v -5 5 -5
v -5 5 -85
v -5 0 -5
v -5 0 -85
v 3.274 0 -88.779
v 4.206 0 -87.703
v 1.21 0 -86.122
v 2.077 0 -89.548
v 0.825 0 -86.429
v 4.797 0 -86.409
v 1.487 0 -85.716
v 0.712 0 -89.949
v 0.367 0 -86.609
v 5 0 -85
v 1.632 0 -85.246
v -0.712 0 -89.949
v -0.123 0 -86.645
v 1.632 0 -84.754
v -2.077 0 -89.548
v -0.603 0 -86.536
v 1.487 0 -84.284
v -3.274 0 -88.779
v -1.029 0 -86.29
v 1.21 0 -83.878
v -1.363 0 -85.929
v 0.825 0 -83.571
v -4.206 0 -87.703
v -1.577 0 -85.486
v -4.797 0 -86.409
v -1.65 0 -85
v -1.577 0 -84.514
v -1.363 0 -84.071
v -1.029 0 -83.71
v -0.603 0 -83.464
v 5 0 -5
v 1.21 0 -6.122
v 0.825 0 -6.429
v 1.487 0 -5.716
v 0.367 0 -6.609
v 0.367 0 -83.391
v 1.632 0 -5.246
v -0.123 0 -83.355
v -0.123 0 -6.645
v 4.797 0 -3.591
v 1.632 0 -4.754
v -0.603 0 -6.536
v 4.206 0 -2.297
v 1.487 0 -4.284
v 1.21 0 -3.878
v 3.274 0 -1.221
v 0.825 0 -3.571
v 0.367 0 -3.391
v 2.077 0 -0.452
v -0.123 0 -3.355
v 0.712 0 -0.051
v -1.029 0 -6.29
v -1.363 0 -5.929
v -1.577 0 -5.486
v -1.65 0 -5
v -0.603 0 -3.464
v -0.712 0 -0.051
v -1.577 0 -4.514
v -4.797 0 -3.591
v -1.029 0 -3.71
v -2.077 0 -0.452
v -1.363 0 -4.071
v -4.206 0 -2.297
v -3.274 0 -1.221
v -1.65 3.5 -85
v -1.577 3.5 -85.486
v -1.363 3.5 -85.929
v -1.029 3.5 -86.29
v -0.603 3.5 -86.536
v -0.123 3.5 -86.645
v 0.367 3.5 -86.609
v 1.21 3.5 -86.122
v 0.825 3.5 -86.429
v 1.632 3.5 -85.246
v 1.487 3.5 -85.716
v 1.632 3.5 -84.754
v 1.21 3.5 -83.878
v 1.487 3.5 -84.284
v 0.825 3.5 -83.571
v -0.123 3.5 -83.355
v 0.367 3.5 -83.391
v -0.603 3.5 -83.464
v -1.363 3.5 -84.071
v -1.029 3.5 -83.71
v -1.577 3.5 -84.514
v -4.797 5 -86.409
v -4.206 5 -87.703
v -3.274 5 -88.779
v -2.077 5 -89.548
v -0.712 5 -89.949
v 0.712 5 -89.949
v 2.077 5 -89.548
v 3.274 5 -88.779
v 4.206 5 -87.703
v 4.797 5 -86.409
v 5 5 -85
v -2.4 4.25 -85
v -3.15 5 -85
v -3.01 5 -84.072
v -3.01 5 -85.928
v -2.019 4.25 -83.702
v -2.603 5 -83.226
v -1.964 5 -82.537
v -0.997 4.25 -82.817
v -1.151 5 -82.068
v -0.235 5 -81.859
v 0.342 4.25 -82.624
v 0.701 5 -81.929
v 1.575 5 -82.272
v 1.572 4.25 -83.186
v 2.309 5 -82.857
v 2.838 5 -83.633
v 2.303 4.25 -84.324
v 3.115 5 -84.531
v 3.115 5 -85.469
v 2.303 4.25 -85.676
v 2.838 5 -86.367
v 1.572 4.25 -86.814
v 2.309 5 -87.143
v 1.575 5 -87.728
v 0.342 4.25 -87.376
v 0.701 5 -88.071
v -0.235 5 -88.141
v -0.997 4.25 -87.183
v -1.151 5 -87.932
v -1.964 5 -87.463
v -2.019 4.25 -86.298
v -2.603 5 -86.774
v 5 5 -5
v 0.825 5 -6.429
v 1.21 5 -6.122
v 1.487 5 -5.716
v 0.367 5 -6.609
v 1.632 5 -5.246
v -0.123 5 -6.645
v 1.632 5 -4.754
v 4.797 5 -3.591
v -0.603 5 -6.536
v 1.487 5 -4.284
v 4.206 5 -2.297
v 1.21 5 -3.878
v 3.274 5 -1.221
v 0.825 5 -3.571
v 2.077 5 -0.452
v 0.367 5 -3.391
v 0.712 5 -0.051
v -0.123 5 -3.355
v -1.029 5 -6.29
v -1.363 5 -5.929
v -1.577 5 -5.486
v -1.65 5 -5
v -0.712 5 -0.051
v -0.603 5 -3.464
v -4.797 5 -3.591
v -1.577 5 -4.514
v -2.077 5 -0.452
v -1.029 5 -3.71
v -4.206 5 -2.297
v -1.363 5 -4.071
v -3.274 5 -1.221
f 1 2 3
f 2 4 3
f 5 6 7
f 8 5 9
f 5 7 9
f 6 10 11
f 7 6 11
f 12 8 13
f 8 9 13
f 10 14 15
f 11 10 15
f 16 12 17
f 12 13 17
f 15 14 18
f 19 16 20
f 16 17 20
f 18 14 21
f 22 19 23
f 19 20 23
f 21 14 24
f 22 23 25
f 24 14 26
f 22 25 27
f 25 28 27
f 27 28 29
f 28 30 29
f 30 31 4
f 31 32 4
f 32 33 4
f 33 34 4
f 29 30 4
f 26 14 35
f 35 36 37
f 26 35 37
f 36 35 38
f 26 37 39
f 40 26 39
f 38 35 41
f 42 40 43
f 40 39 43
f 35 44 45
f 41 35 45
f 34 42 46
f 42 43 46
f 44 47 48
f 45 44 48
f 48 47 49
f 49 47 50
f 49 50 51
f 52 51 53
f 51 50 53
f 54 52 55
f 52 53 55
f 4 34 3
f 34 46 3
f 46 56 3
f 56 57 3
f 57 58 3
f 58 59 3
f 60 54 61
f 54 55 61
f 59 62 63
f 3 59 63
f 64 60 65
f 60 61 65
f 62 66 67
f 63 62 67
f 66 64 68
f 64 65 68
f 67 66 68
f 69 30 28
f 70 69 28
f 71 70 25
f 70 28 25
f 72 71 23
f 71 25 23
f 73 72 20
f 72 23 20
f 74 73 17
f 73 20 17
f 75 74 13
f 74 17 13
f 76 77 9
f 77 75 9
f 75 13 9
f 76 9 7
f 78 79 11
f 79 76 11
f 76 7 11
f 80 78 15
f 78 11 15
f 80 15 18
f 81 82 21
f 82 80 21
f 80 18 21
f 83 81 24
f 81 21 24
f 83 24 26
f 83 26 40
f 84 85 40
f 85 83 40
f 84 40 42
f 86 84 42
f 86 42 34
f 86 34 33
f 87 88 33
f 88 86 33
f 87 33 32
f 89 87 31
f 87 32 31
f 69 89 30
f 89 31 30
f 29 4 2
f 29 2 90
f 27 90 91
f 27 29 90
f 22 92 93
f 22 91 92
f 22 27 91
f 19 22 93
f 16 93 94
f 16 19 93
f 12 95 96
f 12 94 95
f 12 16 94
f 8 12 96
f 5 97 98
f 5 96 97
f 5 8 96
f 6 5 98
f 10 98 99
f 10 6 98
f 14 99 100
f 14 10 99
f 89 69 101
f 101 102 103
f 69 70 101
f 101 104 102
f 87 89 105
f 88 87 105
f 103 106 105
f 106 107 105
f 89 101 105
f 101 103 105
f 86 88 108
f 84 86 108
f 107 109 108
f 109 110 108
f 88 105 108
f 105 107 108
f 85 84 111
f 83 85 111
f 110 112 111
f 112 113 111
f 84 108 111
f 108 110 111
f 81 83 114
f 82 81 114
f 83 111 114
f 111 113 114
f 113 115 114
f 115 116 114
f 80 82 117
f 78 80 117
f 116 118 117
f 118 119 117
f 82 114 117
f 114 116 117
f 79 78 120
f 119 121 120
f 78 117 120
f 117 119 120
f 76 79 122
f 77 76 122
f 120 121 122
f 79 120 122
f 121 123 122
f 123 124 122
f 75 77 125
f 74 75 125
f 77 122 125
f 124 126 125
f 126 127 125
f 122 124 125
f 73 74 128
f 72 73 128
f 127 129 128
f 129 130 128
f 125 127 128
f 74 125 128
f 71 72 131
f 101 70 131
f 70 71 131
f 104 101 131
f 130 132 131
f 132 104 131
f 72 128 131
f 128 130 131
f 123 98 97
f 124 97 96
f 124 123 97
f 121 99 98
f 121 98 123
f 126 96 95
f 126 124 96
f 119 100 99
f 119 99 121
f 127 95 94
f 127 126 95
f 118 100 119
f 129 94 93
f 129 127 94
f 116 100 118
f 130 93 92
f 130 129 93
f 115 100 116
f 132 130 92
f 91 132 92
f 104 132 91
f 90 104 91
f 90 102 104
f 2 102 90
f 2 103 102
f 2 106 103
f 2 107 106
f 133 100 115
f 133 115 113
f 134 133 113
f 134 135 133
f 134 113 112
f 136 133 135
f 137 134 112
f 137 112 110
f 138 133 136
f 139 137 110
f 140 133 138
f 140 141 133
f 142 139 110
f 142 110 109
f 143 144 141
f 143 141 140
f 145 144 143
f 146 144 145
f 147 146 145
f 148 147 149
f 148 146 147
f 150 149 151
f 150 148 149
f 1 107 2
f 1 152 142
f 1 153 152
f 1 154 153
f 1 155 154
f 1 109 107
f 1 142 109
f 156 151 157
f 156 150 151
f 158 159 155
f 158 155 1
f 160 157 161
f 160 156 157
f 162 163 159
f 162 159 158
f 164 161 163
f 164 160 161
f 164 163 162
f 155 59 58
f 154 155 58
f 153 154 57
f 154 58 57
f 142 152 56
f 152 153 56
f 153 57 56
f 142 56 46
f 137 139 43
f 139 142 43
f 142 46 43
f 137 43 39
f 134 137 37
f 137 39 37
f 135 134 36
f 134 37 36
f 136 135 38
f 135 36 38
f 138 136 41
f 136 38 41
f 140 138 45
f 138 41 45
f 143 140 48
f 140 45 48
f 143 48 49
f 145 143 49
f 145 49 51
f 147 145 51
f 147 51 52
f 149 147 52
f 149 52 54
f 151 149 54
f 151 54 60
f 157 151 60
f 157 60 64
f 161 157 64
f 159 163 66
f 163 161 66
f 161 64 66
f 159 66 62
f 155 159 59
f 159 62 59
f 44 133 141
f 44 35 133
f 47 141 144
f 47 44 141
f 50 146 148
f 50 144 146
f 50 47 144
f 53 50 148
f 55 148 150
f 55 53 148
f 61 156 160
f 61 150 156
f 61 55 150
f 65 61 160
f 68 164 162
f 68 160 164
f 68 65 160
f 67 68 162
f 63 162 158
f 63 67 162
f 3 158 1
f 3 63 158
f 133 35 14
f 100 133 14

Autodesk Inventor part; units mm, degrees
ref_plane "YZ Plane" through (0, 0, 0) normal (1, 0, 0) x (0, 1, 0)
ref_plane "XZ Plane" through (0, 0, 0) normal (0, 1, 0) x (-1, 0, 0)
ref_plane "XY Plane" through (0, 0, 0) normal (0, 0, 1) x (1, 0, 0)
sketch "Sketch1" plane through (0, 0, 0) normal (0, 1, 0) x (-1, 0, 0)
  line L0 (0, 0) -> (0, -90) construction
  line L1 (-5, -5) -> (-5, -85)
  line L2 (5, -85) -> (5, -5)
  arc A0 (5, -5) -> (-5, -5) centre (0, -5) ccw
  arc A1 (-5, -85) -> (5, -85) centre (0, -85) ccw
  circle A2 centre (0, -85) radius 1.65
  circle A3 centre (0, -5) radius 1.65
  point P0 (0, -45)
  dimension "d0" = 90
  dimension "d1" = 10
  dimension "d2" = 3.3
extrude "Extrusion1" add sketch "Sketch1" along normal blind 5
chamfer "Chamfer1" distance 1.5 angle 45 1 edges at (1.65, 5, -85)
properties part number "wiper_linkage_middle_arm" material "ABS Plastic"
